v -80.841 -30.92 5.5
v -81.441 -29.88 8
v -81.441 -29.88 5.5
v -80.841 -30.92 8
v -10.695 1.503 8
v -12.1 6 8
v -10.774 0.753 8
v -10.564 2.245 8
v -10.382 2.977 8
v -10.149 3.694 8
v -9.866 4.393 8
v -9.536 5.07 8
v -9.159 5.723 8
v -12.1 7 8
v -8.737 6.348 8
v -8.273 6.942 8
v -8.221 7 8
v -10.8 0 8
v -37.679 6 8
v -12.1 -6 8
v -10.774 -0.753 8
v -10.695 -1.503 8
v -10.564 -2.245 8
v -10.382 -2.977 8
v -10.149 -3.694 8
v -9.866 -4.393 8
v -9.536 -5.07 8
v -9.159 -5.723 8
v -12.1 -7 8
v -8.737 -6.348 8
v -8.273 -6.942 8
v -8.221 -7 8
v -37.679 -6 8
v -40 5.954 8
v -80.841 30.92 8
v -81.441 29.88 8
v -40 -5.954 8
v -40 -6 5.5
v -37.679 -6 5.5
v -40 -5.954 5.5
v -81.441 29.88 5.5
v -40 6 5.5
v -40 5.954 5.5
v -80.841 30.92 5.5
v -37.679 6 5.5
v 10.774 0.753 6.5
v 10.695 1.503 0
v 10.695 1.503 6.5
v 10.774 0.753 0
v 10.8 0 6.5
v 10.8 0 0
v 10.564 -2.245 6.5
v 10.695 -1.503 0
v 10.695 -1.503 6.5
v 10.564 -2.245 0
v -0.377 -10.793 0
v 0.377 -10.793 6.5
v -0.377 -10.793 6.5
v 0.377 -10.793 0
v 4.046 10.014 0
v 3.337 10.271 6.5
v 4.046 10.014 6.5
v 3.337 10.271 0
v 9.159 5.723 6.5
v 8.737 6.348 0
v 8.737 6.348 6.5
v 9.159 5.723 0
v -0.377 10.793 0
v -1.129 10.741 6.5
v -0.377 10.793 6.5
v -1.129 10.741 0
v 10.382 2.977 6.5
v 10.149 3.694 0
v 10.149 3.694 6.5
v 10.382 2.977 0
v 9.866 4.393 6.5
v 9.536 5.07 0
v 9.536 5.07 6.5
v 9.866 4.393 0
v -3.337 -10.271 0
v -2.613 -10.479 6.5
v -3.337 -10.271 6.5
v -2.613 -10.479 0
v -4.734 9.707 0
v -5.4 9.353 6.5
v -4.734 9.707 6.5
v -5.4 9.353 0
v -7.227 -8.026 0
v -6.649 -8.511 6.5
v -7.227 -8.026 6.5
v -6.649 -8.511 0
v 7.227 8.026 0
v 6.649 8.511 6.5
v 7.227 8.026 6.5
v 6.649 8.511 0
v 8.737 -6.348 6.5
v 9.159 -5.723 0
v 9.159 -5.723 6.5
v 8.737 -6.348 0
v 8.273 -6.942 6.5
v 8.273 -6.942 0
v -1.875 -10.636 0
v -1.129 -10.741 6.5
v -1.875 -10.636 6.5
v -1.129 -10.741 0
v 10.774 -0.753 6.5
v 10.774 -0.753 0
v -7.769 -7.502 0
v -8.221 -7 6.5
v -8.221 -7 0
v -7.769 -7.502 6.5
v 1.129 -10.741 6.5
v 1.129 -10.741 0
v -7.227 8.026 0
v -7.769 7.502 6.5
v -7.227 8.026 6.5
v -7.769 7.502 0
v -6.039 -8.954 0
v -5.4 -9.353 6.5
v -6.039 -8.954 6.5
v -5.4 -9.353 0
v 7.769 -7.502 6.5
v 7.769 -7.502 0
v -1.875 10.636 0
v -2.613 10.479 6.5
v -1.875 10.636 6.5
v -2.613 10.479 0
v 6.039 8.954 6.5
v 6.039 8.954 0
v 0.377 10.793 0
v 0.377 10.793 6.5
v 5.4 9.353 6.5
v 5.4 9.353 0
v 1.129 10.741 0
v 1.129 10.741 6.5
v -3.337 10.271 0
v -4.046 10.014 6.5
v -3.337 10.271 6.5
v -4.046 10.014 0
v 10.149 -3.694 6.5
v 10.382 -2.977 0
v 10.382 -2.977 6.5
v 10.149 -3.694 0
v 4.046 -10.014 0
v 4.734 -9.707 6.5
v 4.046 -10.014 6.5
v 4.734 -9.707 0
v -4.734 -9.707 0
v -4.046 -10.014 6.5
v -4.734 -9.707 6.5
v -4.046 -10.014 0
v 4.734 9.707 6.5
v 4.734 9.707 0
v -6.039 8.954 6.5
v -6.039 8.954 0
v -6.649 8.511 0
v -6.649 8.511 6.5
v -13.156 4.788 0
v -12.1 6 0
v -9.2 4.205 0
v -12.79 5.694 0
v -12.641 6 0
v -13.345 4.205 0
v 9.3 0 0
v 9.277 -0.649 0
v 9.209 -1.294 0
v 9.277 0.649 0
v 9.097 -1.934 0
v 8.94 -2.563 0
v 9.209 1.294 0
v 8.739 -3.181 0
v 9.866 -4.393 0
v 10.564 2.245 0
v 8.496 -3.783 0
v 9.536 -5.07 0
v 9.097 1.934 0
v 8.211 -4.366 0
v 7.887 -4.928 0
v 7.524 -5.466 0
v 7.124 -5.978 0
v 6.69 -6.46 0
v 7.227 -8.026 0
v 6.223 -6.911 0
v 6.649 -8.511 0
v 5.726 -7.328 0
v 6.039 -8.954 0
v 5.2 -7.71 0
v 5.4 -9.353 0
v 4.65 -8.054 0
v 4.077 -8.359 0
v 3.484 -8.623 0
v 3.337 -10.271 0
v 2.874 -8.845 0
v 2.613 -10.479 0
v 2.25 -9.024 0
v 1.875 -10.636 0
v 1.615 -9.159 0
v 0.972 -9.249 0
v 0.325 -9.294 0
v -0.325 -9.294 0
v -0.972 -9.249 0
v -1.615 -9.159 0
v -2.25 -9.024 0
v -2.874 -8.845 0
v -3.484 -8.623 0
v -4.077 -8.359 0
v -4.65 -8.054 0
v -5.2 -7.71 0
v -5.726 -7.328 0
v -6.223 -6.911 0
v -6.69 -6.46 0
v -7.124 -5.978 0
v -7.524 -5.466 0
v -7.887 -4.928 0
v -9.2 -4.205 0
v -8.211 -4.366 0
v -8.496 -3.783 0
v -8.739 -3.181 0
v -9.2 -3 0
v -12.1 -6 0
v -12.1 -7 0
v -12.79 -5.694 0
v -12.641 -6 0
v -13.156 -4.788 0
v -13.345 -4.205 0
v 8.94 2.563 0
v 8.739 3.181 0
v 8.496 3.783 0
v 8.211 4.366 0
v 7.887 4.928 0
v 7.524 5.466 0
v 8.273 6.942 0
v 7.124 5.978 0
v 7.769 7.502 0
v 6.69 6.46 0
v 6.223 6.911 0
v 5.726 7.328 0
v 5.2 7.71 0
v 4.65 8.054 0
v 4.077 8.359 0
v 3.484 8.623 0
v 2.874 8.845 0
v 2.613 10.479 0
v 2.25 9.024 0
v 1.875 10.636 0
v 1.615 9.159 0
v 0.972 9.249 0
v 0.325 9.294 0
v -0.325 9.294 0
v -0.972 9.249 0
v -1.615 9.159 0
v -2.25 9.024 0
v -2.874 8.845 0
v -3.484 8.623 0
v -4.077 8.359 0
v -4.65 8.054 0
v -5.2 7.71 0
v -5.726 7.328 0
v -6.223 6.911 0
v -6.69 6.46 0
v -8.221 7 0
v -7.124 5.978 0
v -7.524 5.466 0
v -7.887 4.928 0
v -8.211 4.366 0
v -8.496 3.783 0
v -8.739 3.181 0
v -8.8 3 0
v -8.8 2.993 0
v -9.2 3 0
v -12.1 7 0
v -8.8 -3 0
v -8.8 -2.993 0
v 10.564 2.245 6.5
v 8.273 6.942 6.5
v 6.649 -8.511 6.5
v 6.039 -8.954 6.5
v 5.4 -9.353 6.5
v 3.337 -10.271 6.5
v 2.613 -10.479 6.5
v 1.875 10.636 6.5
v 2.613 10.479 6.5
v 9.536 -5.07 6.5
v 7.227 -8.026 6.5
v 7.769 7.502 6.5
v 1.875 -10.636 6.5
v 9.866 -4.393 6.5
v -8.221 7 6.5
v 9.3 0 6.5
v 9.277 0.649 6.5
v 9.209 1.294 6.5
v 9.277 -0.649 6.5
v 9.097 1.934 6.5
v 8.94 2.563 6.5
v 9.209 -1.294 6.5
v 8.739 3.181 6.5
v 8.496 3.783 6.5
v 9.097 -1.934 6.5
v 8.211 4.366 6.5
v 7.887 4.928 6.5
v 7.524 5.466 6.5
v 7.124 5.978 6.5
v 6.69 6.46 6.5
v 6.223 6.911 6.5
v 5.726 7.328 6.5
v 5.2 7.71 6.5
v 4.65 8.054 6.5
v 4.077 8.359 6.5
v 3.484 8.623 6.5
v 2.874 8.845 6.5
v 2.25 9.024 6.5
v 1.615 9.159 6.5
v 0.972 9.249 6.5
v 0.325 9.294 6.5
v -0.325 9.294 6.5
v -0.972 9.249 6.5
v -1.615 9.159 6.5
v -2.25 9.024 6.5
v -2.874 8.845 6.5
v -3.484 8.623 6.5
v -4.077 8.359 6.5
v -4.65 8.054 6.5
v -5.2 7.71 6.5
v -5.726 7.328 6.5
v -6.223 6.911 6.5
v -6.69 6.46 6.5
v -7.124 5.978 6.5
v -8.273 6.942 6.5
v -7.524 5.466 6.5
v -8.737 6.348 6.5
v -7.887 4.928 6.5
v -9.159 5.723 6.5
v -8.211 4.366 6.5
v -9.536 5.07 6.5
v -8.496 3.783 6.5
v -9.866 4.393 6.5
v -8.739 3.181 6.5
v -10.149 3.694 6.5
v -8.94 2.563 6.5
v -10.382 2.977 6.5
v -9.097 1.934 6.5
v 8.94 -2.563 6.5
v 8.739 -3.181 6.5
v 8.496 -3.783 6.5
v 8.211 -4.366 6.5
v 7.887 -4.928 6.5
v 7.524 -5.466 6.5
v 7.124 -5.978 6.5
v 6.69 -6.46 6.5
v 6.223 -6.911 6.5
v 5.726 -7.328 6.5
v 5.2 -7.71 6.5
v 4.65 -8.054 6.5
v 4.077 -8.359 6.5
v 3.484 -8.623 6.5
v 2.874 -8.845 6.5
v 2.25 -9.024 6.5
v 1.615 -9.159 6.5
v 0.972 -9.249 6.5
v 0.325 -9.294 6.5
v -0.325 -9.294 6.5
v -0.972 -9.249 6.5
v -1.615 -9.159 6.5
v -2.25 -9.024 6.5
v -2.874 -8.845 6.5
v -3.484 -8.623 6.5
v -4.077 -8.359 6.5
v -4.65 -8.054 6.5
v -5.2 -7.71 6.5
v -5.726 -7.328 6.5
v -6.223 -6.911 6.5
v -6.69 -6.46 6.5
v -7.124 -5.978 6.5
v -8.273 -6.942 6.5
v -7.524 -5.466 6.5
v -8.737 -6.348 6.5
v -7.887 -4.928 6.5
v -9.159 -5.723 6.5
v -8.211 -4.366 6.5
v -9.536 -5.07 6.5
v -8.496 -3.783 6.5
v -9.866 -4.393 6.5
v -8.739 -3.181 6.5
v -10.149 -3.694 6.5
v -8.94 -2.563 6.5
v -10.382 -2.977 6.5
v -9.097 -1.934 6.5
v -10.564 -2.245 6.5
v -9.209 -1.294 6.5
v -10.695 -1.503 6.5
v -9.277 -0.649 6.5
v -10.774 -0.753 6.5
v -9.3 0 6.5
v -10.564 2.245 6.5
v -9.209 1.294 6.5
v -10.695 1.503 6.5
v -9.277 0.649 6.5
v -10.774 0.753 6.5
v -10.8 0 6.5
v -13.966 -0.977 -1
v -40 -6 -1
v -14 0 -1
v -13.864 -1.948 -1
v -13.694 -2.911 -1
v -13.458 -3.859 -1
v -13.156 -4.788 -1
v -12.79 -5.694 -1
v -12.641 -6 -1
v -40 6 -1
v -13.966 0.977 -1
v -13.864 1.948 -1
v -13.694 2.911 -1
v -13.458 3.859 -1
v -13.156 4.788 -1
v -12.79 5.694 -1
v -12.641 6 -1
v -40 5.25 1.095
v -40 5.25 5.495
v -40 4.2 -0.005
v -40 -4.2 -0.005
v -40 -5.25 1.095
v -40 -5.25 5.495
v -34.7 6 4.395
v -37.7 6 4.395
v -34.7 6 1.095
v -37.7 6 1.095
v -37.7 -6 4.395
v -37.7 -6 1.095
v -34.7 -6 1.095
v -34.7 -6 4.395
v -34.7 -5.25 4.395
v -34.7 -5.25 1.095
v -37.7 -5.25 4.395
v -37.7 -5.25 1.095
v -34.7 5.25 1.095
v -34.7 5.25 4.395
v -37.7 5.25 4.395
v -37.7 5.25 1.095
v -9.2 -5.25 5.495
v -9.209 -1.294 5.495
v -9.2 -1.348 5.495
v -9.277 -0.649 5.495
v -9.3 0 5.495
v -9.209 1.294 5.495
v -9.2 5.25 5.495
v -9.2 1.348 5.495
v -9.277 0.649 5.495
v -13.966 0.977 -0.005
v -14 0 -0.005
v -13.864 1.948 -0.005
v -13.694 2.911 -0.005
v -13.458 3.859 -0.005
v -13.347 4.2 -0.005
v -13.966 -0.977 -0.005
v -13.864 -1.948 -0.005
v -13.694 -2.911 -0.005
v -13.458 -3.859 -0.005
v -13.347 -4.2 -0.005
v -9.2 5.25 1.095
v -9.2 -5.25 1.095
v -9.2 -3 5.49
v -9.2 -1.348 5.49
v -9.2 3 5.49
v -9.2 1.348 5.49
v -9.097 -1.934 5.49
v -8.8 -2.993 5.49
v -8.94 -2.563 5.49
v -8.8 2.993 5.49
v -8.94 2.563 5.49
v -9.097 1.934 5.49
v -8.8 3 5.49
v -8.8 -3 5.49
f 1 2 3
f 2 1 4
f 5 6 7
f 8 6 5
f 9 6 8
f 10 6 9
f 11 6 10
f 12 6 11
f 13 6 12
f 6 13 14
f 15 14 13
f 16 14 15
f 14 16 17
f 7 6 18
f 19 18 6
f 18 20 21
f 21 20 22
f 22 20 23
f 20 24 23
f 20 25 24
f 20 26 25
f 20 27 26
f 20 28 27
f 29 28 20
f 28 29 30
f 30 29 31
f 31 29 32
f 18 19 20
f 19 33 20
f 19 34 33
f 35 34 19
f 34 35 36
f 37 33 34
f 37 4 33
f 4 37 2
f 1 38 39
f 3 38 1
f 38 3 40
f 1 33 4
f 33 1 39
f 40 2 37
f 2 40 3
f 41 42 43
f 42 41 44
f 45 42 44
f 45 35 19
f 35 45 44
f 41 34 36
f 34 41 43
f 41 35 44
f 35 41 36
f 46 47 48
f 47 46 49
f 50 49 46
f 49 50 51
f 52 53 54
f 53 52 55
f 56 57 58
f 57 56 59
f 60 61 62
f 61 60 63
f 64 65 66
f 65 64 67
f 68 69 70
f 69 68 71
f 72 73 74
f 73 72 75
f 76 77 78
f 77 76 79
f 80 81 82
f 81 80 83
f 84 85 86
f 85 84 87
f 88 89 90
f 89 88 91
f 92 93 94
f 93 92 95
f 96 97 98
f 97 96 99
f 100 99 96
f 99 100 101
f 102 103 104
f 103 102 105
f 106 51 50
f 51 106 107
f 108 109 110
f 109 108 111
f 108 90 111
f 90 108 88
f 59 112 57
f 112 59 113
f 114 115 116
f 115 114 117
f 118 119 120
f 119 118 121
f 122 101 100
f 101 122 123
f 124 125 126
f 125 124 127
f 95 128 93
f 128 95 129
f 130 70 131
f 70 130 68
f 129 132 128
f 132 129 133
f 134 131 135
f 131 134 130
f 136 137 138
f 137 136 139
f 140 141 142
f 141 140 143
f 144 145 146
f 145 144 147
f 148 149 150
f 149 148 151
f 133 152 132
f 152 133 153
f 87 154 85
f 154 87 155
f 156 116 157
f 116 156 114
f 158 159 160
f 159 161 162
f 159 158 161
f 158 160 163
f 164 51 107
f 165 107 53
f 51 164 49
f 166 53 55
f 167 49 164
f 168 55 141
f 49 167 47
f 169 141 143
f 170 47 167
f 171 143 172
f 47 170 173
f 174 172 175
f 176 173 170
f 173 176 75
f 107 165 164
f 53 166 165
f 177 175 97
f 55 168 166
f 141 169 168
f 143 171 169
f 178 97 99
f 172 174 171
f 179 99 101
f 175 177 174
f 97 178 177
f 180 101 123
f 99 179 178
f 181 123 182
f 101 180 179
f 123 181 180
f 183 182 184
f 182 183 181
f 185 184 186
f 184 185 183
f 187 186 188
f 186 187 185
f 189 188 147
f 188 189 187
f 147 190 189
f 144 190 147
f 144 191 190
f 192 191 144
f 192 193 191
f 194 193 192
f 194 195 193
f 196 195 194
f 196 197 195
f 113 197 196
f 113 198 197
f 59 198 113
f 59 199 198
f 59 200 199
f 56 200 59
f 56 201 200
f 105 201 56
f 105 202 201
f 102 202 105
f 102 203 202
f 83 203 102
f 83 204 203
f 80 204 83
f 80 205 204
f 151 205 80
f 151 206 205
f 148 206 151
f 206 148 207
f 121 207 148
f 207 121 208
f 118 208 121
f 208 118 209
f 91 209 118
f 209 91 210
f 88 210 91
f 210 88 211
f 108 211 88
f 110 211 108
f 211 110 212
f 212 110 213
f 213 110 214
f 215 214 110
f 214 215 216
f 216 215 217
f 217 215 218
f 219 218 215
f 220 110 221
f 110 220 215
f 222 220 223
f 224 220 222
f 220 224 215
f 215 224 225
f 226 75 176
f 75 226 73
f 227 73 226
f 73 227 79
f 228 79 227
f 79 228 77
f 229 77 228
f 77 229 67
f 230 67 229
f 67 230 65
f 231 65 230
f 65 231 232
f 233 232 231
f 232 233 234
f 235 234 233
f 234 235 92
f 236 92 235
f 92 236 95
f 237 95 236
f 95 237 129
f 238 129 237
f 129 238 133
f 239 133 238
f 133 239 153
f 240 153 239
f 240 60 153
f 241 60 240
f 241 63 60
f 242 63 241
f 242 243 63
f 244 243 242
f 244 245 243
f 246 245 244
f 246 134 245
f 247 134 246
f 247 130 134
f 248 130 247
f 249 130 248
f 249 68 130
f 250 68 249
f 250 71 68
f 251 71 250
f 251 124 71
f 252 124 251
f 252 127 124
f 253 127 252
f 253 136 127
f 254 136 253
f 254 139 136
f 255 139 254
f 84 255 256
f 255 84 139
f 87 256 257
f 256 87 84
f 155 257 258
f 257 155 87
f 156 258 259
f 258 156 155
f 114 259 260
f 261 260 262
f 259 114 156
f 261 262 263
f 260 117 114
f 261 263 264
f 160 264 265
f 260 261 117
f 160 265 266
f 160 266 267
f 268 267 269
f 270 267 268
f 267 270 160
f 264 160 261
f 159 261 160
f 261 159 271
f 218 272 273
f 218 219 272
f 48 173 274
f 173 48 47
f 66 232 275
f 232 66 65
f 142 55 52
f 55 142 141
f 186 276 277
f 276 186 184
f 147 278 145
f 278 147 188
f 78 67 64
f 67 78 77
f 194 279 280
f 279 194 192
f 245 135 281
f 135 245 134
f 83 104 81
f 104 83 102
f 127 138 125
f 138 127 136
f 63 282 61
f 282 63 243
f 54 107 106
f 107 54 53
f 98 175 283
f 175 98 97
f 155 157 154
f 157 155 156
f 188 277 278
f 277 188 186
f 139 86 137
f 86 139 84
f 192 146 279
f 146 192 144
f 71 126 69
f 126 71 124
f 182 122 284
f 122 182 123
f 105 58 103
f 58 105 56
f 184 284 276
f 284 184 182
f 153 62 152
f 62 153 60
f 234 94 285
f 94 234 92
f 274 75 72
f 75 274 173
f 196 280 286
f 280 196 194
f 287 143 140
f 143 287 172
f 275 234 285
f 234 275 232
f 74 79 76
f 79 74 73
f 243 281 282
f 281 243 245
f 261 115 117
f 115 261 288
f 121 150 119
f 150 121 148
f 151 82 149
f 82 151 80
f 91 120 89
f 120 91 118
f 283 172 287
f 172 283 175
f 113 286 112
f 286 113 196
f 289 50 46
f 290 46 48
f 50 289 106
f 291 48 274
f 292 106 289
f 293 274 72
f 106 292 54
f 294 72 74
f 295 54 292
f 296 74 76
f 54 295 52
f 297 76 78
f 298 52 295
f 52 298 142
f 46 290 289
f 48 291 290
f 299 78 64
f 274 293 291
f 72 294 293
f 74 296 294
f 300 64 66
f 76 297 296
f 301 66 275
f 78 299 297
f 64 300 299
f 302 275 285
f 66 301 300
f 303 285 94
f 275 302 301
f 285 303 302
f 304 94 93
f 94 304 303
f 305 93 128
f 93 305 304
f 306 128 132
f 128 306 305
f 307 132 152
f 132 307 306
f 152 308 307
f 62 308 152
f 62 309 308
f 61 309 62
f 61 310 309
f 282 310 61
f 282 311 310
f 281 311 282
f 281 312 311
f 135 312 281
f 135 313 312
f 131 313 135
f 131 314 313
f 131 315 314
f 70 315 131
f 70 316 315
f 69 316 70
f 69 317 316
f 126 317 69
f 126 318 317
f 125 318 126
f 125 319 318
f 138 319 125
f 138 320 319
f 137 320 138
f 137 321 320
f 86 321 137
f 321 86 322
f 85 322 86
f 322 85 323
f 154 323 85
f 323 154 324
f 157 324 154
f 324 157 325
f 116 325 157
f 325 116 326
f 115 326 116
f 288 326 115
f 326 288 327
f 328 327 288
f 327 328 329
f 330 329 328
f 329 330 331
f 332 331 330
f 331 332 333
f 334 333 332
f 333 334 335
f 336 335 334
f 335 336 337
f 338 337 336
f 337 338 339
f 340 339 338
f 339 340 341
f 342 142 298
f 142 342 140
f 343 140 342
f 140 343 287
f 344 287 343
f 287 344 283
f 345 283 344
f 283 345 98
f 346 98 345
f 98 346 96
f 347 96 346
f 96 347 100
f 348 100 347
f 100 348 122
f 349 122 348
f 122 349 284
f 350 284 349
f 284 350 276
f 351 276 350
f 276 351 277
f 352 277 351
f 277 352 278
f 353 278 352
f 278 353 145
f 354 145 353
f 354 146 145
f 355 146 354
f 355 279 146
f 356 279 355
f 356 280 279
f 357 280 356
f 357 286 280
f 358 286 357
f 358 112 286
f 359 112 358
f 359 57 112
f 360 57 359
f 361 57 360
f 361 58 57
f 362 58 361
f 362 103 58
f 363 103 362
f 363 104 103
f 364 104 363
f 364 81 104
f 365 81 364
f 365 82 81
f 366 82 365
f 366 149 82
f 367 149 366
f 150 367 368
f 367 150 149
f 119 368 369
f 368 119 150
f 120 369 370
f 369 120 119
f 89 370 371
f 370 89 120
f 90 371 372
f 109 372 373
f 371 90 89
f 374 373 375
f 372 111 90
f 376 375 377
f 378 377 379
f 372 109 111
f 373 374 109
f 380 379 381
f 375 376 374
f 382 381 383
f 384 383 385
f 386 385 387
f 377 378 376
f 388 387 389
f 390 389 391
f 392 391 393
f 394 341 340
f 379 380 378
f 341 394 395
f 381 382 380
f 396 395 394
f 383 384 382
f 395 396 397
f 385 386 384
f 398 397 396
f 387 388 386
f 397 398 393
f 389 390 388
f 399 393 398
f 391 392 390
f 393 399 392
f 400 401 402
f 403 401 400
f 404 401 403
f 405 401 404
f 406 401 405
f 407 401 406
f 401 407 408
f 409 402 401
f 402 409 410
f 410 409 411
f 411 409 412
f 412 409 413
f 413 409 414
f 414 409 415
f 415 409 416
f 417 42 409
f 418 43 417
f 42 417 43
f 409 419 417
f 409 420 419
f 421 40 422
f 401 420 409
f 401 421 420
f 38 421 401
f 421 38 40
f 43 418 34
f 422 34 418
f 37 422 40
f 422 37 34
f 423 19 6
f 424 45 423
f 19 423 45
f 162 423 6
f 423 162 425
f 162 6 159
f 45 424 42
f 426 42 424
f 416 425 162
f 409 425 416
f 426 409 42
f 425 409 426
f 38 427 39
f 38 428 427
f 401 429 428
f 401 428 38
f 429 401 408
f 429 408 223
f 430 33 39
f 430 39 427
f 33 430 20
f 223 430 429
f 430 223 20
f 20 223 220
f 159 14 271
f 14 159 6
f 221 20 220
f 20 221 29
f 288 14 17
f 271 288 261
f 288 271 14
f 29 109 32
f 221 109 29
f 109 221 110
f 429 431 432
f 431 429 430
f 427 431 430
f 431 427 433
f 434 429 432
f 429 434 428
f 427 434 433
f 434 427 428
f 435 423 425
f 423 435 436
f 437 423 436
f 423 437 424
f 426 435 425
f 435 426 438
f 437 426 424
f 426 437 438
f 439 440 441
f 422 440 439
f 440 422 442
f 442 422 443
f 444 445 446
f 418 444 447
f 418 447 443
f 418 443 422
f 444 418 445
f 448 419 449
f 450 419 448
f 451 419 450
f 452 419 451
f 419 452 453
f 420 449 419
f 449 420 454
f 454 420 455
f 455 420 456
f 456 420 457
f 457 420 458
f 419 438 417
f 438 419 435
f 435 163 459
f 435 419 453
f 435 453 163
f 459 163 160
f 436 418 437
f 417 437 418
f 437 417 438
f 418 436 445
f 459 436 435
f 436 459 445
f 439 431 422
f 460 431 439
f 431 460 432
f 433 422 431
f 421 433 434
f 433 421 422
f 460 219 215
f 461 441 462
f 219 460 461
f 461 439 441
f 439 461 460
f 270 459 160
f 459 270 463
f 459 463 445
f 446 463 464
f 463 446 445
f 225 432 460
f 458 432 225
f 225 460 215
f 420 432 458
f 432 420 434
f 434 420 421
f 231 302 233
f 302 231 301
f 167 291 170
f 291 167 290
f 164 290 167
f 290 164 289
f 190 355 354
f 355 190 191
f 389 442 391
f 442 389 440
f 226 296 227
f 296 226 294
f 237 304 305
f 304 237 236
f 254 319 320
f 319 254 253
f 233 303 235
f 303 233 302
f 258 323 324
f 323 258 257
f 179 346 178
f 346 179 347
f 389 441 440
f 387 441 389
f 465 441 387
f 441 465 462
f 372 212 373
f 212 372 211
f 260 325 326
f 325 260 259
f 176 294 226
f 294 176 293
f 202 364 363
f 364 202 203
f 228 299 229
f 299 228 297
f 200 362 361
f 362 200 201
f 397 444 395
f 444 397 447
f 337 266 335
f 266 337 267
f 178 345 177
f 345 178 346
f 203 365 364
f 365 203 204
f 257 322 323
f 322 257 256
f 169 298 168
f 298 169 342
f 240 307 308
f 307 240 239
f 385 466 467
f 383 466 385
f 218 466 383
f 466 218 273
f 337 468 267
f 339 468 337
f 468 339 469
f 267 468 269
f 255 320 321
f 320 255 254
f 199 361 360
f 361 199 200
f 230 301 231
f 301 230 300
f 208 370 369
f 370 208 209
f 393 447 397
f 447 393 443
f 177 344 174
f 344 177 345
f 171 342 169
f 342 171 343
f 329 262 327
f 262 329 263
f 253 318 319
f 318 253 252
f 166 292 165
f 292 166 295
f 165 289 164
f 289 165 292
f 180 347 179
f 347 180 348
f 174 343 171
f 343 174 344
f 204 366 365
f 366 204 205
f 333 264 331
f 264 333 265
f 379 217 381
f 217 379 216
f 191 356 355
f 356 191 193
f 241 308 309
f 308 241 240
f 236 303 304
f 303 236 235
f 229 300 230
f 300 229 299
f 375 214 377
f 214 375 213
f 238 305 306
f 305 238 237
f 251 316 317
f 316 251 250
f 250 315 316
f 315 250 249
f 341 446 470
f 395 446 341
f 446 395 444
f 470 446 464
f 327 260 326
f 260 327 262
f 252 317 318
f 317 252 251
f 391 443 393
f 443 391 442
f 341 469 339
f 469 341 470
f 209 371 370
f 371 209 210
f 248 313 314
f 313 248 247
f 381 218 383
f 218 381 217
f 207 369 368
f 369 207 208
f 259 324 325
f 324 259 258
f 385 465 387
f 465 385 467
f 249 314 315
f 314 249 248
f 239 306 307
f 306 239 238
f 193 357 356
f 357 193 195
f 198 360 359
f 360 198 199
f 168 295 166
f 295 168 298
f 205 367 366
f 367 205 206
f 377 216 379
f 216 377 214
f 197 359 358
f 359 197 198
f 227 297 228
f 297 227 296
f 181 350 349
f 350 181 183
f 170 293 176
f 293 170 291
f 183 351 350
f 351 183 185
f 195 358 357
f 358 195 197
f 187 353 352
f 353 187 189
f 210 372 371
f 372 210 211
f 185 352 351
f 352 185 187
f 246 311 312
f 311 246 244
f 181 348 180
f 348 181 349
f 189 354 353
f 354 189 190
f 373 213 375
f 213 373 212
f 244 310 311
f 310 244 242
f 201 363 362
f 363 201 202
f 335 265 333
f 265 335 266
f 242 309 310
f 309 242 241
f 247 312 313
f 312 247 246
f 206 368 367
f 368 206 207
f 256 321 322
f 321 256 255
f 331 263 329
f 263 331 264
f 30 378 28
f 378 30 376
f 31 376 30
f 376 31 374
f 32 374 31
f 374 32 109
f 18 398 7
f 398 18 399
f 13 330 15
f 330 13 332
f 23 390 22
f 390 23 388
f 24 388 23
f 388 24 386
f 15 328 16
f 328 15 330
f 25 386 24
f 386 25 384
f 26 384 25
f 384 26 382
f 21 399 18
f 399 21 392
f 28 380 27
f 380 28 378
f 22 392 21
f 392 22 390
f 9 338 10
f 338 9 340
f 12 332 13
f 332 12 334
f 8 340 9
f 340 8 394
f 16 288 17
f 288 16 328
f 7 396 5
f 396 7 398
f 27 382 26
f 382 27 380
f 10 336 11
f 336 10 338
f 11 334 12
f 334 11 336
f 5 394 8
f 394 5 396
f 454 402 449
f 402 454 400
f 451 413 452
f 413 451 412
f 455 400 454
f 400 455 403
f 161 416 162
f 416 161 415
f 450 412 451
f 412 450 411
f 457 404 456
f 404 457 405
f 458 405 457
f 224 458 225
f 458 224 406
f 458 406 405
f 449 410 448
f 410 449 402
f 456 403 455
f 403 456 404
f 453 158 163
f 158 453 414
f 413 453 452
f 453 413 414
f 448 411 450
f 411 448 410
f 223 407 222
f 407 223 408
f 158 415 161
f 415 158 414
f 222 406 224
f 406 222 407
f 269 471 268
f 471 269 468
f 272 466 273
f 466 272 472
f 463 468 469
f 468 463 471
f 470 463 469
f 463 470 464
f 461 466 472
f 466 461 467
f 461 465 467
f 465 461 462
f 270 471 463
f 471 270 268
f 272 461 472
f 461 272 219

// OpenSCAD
// file: HallSensor.scad
//############################################################################## 
//                          Odometer Body
//############################################################################## 
// 
// Odometer for the toy car Tamiya TT-02. The odometer can be mounted at the
// differential output shaft.
//
// This part is the Hall Sensor itself.
//

// Dimensions of "Infineon TLE 4905L"
body_l = 3.29;
body_w = 4.16;
body_h = 1.52;

bevel_w = 0.8;
bevel_h = 0.8;

wire_l = 20;
wire_w = 0.4;
wire_h = 0.2;
wire_pos_h = body_h - 0.79;
wire_dist = 1.27;

module HallSensor() {
    // Wire
    module Wire() {
        color("LightSteelBlue")
        translate([0, -wire_w/2, -wire_h/2])
        rotate([0, -90, 0])
        cube(size=[wire_h, wire_w, wire_l]);
    }

    // Body of the Hall Sensor
    color("Gray")
    rotate([0, -90, 0])
    linear_extrude(height=body_l)
    polygon(points=[
        [ 0                ,  body_w/2           ],
        [ body_h - bevel_h ,  body_w/2           ],
        [ body_h           ,  body_w/2 - bevel_w ],
        [ body_h           , -body_w/2 + bevel_w ],
        [ body_h - bevel_h , -body_w/2           ],
        [ 0                , -body_w/2           ],
    ]);

    // Create and place the wires
    translate([-body_l, wire_dist, wire_pos_h])
    Wire();
    translate([-body_l, 0, wire_pos_h])
    Wire();
    translate([-body_l, -wire_dist, wire_pos_h])
    Wire();
}

function HallSensor_body_l() = body_l;
function HallSensor_body_w() = body_w;
function HallSensor_body_h() = body_h;

HallSensor();
// file: Magnet.scad
//############################################################################## 
//                          Odometer Magnet Wheel
//############################################################################## 
// 
// Odometer for the toy car Tamiya TT-02. The odometer can be mounted at the
// differential output shaft.
//
// This part is the magnet that triggers the hall sensor. A number of magnets
// are mounted in the magnet wheel. 

// Interface values
function Magnet_d() = 2;
function Magnet_w() = 2; 

module Magnet() {
    $fa = 4;
    $fs = 0.4;

    cylinder(d=Magnet_d(), h=Magnet_w());
}

Magnet();
// file: SensorInsert.scad
//############################################################################## 
//                          Odometer Hall Sensor Insert
//############################################################################## 
// 
// Odometer for the toy car Tamiya TT-02. The odometer can be mounted at the
// differential output shaft.
//
// This part is the insert that carries the hall sensor. It snaps into the body.
//
// Current State
// ====================
// 
// * The current locking mechanism seems very secure.
// * The insert can reasonably easily be removed with the handles.
//
// * The insert is big enough for the sensor, and maybe also for a circuit
//   board.
//
// * It needs to be tested if the sensor gets close enough to the magnets to
//   trigger.
//

use <helpers.scad>

use <HallSensor.scad>

// Dimensions of the main part ------------------
main_l = 24;
main_w = 10;
main_h = 5;

bevel_w = 1;
wall_t = 1;

// Dimensions of the locking mechanism ----------
// Teeth
teeth_l = 2;
teeth_w = 1;
teeth_h = 3;
teeth_pos_l = 4;
teeth_pos_h = 1.0;

// Cantilever / Strip
lock_l = 15;
lock_w = 1;
lock_h = main_h;

// Grip
grip_l = 2;
grip_w = 3;
grip_h = lock_h;

// The locking part, consisting of two strips / cantilevers with teeth.
module SensorInsert_lock() {
    // Tooth for locking
    module lock_tooth() {
        linear_extrude(height=teeth_h)
        polygon(points=[
            [ 0      , 0       ],
            [-teeth_l, 0       ],
            [-teeth_l,-teeth_w ],
            [-teeth_w,-teeth_w ],
        ]);
    }

    // Outer shape of the insert
    module main_shape() {
        rotate([0, -90, 0])
        linear_extrude(height=lock_l)
        SensorInsert_front_side_2D();
    }

    // The plastic strip that carries the tooth
    module lock_strip() {
        // Create the strip, and shape it like the outer shape of the insert.
        intersection() {
            translate([-lock_l, -main_w/2,  0])
            cube(size=[lock_l, lock_w, lock_h]);

            main_shape();
        }

        // Create and position the tooth
        translate([-teeth_pos_l + teeth_l, - main_w/2,  teeth_pos_h])
        lock_tooth();

        // Create and position the grip
        translate([-lock_l, -main_w/2 - grip_w + lock_w, 0])
        cube(size=[grip_l, grip_w, grip_h]);
    }

    // Strip 1
    lock_strip();

    // Strip 2
    mirror([0, 1, 0]) 
    lock_strip();
}

// // Symmetrically bevelled front side
// module SensorInsert_front_side_2D() {
//     polygon(points=[
//         [ 0               ,  main_w/2 - bevel_w ],
//         [ bevel_w         ,  main_w/2           ],
//         [ main_h - bevel_w,  main_w/2           ],
//         [ main_h          ,  main_w/2 - bevel_w ],
//         [ main_h          , -main_w/2 + bevel_w ],
//         [ main_h - bevel_w, -main_w/2           ],
//         [ bevel_w         , -main_w/2           ],
//         [ 0               , -main_w/2 + bevel_w ],
//     ]);
// }

// // Front side which is bevelled at the top
// module SensorInsert_front_side_2D() {
//     polygon(points=[
//         [ 0               ,  main_w/2           ],
//         [ bevel_w         ,  main_w/2           ],
//         [ main_h - bevel_w,  main_w/2           ],
//         [ main_h          ,  main_w/2 - bevel_w ],
//         [ main_h          , -main_w/2 + bevel_w ],
//         [ main_h - bevel_w, -main_w/2           ],
//         [ bevel_w         , -main_w/2           ],
//         [ 0               , -main_w/2           ],
//     ]);
// }

// Front side which is bevelled at the bottom
module SensorInsert_front_side_2D() {
    polygon(points=[
        [ 0               ,  main_w/2 - bevel_w ],
        [ bevel_w         ,  main_w/2           ],
        [ main_h - bevel_w,  main_w/2           ],
        [ main_h          ,  main_w/2           ],
        [ main_h          , -main_w/2           ],
        [ main_h - bevel_w, -main_w/2           ],
        [ bevel_w         , -main_w/2           ],
        [ 0               , -main_w/2 + bevel_w ],
    ]);
}

// Front side of the hollow space inside of the insert.
module SensorInsert_front_side_negative_2D() {
    offset(delta=-wall_t) {
        SensorInsert_front_side_2D();
    }
    polygon(points=[
        [ main_h - wall_t - 1 , main_w/2 - bevel_w ],
        [ main_h + 1          , main_w/2 - bevel_w ],
        [ main_h + 1          ,-main_w/2 + bevel_w ],
        [ main_h - wall_t - 1 ,-main_w/2 + bevel_w ],
    ]);
}

module SensorInsert() {
    // Create the main part
    difference() {
        rotate([0, -90, 0])
        linear_extrude(height=main_l)
        SensorInsert_front_side_2D();

        // Hollow space in main part
        translate([-1, 0, 0])
        rotate([0, -90, 0])
        linear_extrude(height=main_l - wall_t*2 )
        SensorInsert_front_side_negative_2D();

        // Create a small indentation for the sensor
          sensor_body_l = HallSensor_body_l() + 0.5; 
          sensor_body_w = HallSensor_body_w() + 0.5; 
          sensor_body_h = HallSensor_body_h() + 0.5; 
        translate([-0.6, 0, 0.5])
        translate([
            -sensor_body_l, 
            -sensor_body_w / 2, 
            0
        ])
        cube([
            sensor_body_l, 
            sensor_body_w, 
            sensor_body_h
        ]);

        // Create a slot for the cables
        slot_l = wall_t + 0.02;
        slot_w = main_w - wall_t*2;
        slot_h = 2;
        translate([-main_l - 0.01, -slot_w/2, wall_t])
        cube(size=[slot_l, slot_w, slot_h]);
    }

    // Create the locking mechanism
    translate([-main_l, 0, 0])
    SensorInsert_lock();
}

// The hollow space needed by the sensor insert
module SensorInsert_negative() {
    // Make the hollow space slightly bigger than the insert.
    scale([1, 1.05, 1.1]) {
        // Create the main part
        rotate([0, -90, 0])
        linear_extrude(height=main_l + lock_l + 5)
        SensorInsert_front_side_2D();

        // Create pockets for the teeth of the locking mechanism.
        pocket_l = teeth_l * 1.5;
        pocket_w = teeth_w * 1.1;
        pocket_h = teeth_h * 1.0;
        mirror_copy([0, 1, 0])
        translate([
            -teeth_pos_l - main_l - (pocket_l - teeth_l)/2, 
            - main_w/2 - pocket_w + 0.01,  
            teeth_pos_h
        ])
        cube(size=[pocket_l, pocket_w, pocket_h]);
    }
}

function SensorInsert_total_h() = main_h;

SensorInsert();

%SensorInsert_negative();
// file: MagnetWheel.scad
//############################################################################## 
//                          Odometer Magnet Wheel
//############################################################################## 
// 
// Odometer for the toy car Tamiya TT-02. The odometer can be mounted at the
// differential output shaft.
//
// This part is a wheel with magnets in it. It is mounted with friction on the
// output shaft of a differential.
//
// Current State
// ====================
// 
// * The part can be mounted and it can turn.
//
// * The inner diameter is good. The wheel sticks tightly on the universal
//   joint. The part can be mounted with only little difficulty.
// * The magnet diameter is good. The magnets can be easily mounted and stick in
//   the wheel.
//
// * The hub is somewhat fragile. However this poses no problems, because in
//   operation it is supported by the universal joint.
//
// * The hub should be slightly longer, the locking mechanism rubs on the body.
//
// * The locking teeth should be bigger. The body can be easily removed even
//   when the odometer is mounted on the universal joint.
//

use <helpers.scad>

use <Magnet.scad>

    // Hub
    hub_inner_d = 16;
    hub_outer_d = 18;
    hub_bearing_w = 7;

    // Clip cone
    clip_cone_w = 2.5;
    clip_cone_teeth_h = 0.6;
    clip_cone_outer_d = hub_outer_d + clip_cone_teeth_h*2;

    // Hub
    hub_width = Magnet_w() + hub_bearing_w + clip_cone_w;

    // Holes for magnets
    mag_hole_d = Magnet_d();
    mag_hole_w = Magnet_w();
    mag_hole_circle_d = hub_outer_d + 2*(1+Magnet_d()/2);

    // Disk
    disk_outer = hub_outer_d + 2*(1+Magnet_d()+1);
    disk_width = Magnet_w();

module MagnetWheel() {
    $fa = 4;
    $fs = 0.4;

    // render()
    difference() {
        union() {
            // Hub
            cylinder(d=hub_outer_d, h=hub_width);
            // Disk    
            cylinder(d=disk_outer, h=disk_width);
            // Clip cone
            clip_cone_w1 = clip_cone_w - clip_cone_teeth_h;
            clip_cone_w2 = clip_cone_teeth_h;
            translate([0, 0, hub_width - clip_cone_w1]) 
            cylinder(
                d1=clip_cone_outer_d, 
                d2=hub_outer_d, 
                h=clip_cone_w1
            );
            translate([0, 0, hub_width - clip_cone_w]) 
            cylinder(
                d1=hub_outer_d, 
                d2=clip_cone_outer_d, 
                h=clip_cone_w2
            );
        }

        // Central hole
        translate([0, 0, -0.1]) 
        cylinder(
            d=hub_inner_d, 
            h=hub_width + 0.2
        );

        // Holes for magnets
        magnet_circle_r = mag_hole_circle_d/2;
        for(a = [0: 30: 360]) {
            translate([
                magnet_circle_r*cos(a), 
                magnet_circle_r*sin(a), 
                -0.1
            ]) 
            cylinder(d=mag_hole_d, h=mag_hole_w + 0.2);
        }

        // Slots for the clip function
        slot_length = 4;
        for (a=[0, 45, 90, 135]) {
            rotate([0, 0, a])
            translate([0, 0, hub_width - slot_length/2]) 
            cube(
                [hub_outer_d + 4, 1, slot_length + 0.01], 
                center=true
            );
        }
    }
}

// // The free space which the magnet wheel needs
// tolerance_axial = 0.5;
// tolerance_radial = 0.6;

// module MagnetWheel_negative() {
//     scale_f = (hub_outer_d + 2*tolerance_radial) / hub_outer_d;
//     // render()
//     scale([scale_f, scale_f, 1])
//     // Translate and copy 
//     translate_copy([0, 0, -tolerance_axial])
//     // close small holes and slots by rotating and copying
//     rotate_copy([0, 0, 6])
//     rotate_copy([0, 0, 6])
//     union() {
//         MagnetWheel();
//         // Close the center hole
//         cylinder(d=hub_inner_d, h=hub_width);
//         // Cylinder instead of clip cone
//         translate([0, 0, hub_width - clip_cone_w]) 
//         cylinder(
//             d=hub_outer_d + clip_cone_teeth_h*2,
//             h=clip_cone_w
//         );
//     }
// }

// Interface values
function MagnetWheel_hub_outer_d() = hub_outer_d;
function MagnetWheel_hub_bearing_w() = hub_bearing_w;
function MagnetWheel_total_w() = hub_width;
function MagnetWheel_disk_outer_d() = disk_outer;
function MagnetWheel_disk_w() = disk_width;
function MagnetWheel_lock_outer_d() = disk_outer;
function MagnetWheel_lock_w() = disk_width;

MagnetWheel();

// %MagnetWheel_negative();
// file: helpers.scad
//##############################################################################
//                               Helpers
//##############################################################################
//
// Helper functions and modules


// A mirror module that retains the original
// object in addition to the mirrored one.
//
// Taken from:
// 
// https://en.wikibooks.org/wiki/OpenSCAD_User_Manual/Tips_and_Tricks#Create_a_mirrored_object_while_retaining_the_original
//
module mirror_copy(v=[1, 0, 0]) {
    children();

    mirror(v) 
    children();
}

// A rotation module that retains the original
// object in addition to the mirrored one.
module rotate_copy(a=[10, 10, 10]) {
    children();

    rotate(a) 
    children();
}

// A translation module that retains the original
// object in addition to the mirrored one.
module translate_copy(t=[0, 0, 0]) {
    children();

    translate(t) 
    children();
}
// main file
//############################################################################## 
//                          Odometer Body
//############################################################################## 
// 
// Odometer for the toy car Tamiya TT-02. The odometer can be mounted at the
// differential output shaft.
//
// This part is the body of the odometer.
//
// Current State
// ====================
// 
// * The body fits into the car.
// * The magnet wheel can turn.
// * Wheel and body click together nicely.
// * Body and wheel stay together well aligned. However they can be separated
//   with little force.
//
// * The body should not be longer than its current length. It is close to the
//   limit.
//
// * The current supports are somewhat difficult to remove.
//
// * The "bone" of the universal joint rubs strongly against the wheel hub.
// 

use <helpers.scad>

use <MagnetWheel.scad>
use <SensorInsert.scad>

// Bearing - cylindrical part
bearing_inner_d = MagnetWheel_hub_outer_d() + 0.6; // The wheel hub is widened by pressure
bearing_outer_d = bearing_inner_d + 3;
bearing_h = MagnetWheel_hub_bearing_w() - 0.5;

// Flat part - the hall sensor slides into this section
flat_l = 40;
flat_w = 12;
flat_h = MagnetWheel_hub_bearing_w() + 2;
flat_pos_h = -1;
// Brace - reinforcement at root of the flat part
brace_l = 5.6;
brace_w = flat_w + 2;
brace_h = flat_h;
// // Plate that closes the bottom
// // TODO: This should really be just the flat part
// bottom_l = flat_l - MagnetWheel_disk_outer_d()/2 - 1;
// bottom_w = flat_w;
// bottom_h = 2;
// bottom_pos_l = MagnetWheel_disk_outer_d()/2 + 1;

// Strips - to keep the odometer from turning
strip_l = 50;
strip_w = 1.2;
strip_h = 2.5;
strip_ang = 30;

// Position of the sensor insert
insert_pos_l = bearing_inner_d/2;
insert_pos_h = -0.005;

module Body() {
    $fa = 4;
    $fs = 0.4;

    difference() {
        union() {
            // Bearing - cylindrical part
            cylinder(d=bearing_outer_d, h=bearing_h);

            // Flat part
            translate([-flat_l, -flat_w/2, flat_pos_h])
            cube([flat_l, flat_w, flat_h]);
            
            // Brace at root of flat part
            translate([
                -brace_l/2 - bearing_inner_d/2, 
                -brace_w/2, 
                flat_pos_h
            ]) 
            cube([brace_l, brace_w, brace_h]);

            // // Brace at end of flat part
            // translate([
            //     -flat_l, 
            //     -flat_w/2, 
            //     0
            // ]) 
            // cube([brace_l, flat_w, brace_h]);

            // // Bottom
            // translate([-bottom_l - bottom_pos_l, -bottom_w/2, -bottom_h])
            // cube(size=[bottom_l, bottom_w, bottom_h]);

            // Strips
            mirror_copy([0, 1, 0])
            translate([
                -flat_l + strip_w*1.8, 
                -flat_w/2 + strip_w/2, 
                flat_h + flat_pos_h - strip_h
            ]) 
            rotate([0, 0, 180 + strip_ang]) 
            translate([0, -strip_w/2, 0])
            cube([strip_l, strip_w, strip_h]);
        }

        // Create the necessary space for the magnet wheel
        // MagnetWheel_negative();
        // Hole in bearing
        translate([0, 0, -0.1])
        cylinder(d=bearing_inner_d, h=bearing_h + 0.2);
        // Space for locking mechanism
        translate([0, 0, bearing_h])
        cylinder(d=bearing_outer_d, h=5);
        // Space for the magnet disk
        translate([0, 0, -5])
        cylinder(d=MagnetWheel_disk_outer_d() + 2, h=5);

        
        // Create the necessary space for the sensor insert.
        translate([-insert_pos_l + 0.1, 0, insert_pos_h])
        SensorInsert_negative();

        // Remove the thin wall where the insert touches the bearing's hole
        cut_l = 1;
        cut_w = 6;
        translate([-cut_l/2 - bearing_inner_d/2, -cut_w/2, -0.01]) 
        cube(size=[cut_l, cut_w, SensorInsert_total_h() + 0.5]);
    }
}

function Body_total_h() = flat_h;
function Body_insert_pos_l() = insert_pos_l;
function Body_insert_pos_h() = insert_pos_h;

Body();
